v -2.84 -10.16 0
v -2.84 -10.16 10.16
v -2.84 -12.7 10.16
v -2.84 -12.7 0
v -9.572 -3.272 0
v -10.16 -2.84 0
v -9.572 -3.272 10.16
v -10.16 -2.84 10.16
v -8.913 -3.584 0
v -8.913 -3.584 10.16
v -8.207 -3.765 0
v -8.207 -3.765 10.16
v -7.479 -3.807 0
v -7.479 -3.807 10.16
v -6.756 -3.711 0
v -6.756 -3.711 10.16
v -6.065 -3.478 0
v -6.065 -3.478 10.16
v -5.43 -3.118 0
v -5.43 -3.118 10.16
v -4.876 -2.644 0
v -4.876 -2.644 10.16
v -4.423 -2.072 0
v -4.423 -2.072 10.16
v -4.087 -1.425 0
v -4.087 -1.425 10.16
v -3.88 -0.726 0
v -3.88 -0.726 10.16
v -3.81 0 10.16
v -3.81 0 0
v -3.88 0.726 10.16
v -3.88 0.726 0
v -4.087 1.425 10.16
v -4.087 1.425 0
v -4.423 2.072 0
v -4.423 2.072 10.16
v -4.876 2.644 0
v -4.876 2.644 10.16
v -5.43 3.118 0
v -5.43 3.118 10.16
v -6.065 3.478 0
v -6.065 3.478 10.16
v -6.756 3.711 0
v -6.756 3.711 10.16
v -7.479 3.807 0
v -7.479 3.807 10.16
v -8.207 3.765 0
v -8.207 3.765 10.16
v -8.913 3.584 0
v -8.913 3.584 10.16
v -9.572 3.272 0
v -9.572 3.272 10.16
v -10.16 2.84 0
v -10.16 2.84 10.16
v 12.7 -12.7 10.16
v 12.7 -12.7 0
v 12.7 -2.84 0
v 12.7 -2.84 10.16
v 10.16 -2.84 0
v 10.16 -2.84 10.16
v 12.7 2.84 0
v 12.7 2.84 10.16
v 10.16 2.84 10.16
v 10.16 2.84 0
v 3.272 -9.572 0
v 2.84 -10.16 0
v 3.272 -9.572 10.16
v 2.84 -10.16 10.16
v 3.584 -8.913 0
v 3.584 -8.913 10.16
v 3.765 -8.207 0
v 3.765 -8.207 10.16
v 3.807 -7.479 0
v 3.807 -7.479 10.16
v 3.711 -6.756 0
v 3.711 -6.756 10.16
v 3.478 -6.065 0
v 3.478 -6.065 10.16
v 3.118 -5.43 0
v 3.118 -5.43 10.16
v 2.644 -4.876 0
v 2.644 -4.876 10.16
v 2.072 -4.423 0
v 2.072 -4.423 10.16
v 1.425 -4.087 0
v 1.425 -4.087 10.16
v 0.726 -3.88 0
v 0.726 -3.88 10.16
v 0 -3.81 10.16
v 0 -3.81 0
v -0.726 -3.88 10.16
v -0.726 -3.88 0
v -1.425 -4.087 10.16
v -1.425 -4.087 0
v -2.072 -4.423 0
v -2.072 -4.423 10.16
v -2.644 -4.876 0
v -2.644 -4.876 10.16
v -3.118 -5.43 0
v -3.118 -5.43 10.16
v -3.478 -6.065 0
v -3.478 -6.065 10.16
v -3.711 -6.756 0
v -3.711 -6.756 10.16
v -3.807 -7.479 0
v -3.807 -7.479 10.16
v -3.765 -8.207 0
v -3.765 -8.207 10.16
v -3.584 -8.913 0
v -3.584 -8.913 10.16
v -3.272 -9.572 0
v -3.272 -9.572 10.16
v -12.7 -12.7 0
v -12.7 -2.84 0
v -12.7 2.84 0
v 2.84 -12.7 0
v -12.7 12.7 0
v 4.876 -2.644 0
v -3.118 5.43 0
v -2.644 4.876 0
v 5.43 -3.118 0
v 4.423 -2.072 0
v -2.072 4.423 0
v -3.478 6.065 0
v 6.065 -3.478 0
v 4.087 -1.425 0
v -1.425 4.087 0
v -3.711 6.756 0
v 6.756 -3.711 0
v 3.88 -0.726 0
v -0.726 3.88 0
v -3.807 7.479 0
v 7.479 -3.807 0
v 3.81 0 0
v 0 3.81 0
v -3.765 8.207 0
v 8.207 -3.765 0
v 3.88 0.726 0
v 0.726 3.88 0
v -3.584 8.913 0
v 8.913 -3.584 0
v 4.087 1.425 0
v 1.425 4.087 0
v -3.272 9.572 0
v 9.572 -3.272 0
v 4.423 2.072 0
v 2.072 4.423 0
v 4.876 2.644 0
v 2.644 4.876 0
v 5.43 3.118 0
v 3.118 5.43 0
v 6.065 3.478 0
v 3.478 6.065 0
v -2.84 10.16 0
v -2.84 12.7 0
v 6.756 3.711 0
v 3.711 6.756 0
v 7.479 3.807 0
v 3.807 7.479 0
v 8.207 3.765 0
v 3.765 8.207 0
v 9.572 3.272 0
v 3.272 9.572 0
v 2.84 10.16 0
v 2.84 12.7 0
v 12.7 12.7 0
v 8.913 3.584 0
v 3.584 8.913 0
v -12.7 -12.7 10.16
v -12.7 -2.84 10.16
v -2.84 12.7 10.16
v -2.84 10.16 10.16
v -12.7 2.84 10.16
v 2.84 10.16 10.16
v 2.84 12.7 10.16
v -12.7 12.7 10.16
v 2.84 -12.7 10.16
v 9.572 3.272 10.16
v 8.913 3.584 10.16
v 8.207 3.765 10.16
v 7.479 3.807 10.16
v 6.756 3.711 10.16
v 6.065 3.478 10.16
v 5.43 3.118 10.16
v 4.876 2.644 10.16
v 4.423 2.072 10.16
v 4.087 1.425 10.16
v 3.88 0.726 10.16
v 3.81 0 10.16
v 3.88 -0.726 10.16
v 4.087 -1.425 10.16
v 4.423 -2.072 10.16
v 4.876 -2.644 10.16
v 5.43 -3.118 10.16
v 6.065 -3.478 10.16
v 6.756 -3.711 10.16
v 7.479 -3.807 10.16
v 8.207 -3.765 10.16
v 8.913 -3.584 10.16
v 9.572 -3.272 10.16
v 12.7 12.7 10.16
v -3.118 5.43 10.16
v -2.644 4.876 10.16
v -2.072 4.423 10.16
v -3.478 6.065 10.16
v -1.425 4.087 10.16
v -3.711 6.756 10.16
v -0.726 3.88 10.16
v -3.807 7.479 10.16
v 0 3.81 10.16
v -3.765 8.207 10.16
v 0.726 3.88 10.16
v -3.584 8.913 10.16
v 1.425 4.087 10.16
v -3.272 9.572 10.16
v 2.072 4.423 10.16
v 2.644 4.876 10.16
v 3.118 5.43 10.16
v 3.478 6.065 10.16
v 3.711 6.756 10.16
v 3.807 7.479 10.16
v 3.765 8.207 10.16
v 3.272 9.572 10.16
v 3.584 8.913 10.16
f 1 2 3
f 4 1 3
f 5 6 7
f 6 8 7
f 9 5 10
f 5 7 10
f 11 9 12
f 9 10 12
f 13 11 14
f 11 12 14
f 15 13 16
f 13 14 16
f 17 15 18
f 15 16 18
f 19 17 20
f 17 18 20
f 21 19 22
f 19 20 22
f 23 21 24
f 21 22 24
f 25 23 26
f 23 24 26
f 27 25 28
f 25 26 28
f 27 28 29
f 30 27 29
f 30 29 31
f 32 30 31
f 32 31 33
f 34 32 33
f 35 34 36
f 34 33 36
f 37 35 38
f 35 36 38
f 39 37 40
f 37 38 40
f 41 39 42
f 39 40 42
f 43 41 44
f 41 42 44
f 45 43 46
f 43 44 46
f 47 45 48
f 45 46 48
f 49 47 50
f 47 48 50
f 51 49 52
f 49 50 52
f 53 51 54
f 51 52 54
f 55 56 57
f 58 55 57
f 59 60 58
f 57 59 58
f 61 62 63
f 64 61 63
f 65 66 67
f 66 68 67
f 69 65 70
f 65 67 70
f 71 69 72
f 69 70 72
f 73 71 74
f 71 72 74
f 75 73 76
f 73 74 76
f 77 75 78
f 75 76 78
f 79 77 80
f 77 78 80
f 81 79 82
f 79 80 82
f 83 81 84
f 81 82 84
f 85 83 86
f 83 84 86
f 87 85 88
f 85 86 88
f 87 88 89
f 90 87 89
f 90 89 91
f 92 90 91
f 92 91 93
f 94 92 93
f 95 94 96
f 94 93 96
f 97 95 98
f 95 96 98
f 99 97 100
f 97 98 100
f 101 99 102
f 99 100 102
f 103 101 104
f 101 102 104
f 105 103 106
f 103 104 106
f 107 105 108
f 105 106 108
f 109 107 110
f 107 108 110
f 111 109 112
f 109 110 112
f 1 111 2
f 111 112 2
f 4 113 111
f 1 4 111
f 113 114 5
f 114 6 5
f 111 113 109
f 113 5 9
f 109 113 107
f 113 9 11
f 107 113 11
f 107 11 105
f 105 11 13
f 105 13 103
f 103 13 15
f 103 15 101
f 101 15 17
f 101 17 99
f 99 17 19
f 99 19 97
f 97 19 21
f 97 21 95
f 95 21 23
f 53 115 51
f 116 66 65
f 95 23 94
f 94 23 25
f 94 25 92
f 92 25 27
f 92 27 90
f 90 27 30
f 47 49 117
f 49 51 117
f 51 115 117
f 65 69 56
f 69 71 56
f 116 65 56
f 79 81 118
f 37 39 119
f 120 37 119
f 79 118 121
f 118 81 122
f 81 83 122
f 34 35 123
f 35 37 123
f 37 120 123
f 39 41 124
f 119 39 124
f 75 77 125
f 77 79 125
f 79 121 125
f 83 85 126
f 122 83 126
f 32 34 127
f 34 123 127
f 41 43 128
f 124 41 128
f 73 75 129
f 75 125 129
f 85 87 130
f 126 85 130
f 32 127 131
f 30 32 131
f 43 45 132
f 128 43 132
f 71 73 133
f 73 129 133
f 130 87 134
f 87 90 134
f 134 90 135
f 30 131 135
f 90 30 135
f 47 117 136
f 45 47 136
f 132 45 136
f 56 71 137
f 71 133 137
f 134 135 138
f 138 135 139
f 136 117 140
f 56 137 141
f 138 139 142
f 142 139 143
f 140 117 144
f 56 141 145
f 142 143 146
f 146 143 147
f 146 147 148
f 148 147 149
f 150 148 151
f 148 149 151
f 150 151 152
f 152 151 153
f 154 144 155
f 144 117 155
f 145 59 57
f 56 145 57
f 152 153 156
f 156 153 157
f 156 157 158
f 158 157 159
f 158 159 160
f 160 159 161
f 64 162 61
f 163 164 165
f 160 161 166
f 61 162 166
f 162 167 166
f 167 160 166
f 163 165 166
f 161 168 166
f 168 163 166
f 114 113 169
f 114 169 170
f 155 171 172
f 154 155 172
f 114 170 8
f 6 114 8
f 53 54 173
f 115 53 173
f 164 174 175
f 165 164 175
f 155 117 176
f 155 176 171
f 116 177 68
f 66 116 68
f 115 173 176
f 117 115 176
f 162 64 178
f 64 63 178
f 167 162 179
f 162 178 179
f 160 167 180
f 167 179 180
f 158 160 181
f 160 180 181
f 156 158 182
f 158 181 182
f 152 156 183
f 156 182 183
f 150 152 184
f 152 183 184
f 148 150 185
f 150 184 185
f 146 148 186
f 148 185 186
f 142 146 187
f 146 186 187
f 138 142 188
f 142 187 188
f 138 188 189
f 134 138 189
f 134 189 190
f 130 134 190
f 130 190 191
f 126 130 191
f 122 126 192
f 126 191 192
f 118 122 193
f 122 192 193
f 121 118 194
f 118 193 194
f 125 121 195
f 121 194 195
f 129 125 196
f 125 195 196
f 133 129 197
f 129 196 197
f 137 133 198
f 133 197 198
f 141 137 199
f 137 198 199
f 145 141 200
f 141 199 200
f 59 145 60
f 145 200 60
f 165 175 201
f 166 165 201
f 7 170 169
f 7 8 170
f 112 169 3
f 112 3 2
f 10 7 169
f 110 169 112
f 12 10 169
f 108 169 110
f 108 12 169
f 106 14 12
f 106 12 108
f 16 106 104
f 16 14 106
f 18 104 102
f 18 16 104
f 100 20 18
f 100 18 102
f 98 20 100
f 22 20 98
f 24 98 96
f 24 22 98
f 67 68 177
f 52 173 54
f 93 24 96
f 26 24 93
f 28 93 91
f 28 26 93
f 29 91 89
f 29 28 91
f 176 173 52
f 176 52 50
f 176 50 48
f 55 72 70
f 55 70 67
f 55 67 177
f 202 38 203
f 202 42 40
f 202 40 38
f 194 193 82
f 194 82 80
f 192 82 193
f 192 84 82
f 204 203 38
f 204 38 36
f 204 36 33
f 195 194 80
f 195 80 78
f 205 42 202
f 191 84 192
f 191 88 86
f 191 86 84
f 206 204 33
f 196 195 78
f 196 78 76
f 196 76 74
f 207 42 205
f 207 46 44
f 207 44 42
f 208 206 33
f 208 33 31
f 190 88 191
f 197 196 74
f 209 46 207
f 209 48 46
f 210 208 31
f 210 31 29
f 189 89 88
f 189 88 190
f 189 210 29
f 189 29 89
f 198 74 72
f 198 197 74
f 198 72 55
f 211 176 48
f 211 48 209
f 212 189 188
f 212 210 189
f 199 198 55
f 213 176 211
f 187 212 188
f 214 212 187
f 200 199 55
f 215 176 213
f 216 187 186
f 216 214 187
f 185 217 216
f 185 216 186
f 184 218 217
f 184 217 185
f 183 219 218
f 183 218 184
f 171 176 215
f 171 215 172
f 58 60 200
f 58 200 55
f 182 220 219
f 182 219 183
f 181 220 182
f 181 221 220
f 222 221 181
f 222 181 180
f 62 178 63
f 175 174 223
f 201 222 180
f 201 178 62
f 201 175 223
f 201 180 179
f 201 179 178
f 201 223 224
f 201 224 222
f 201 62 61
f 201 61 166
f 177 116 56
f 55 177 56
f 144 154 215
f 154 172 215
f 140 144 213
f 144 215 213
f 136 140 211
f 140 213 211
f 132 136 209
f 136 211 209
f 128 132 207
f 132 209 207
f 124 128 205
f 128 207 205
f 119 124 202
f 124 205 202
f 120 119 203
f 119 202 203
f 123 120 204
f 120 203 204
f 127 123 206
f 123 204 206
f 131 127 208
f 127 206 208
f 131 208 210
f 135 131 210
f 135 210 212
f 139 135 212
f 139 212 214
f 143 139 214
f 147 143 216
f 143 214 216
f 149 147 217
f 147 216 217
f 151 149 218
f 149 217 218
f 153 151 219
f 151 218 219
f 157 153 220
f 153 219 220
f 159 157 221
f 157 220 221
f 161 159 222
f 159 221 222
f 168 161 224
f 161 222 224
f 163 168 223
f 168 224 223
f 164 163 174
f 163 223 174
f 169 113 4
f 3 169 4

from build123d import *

# Parameters (mm, degrees)
F0_W            = 25.4
F0_H            = 25.4
F1_DEPTH        = 10.16
F2_R            = 3.81
F3_DEPTH        = 25.4
F3_COPIES_COUNT = 4
F5_DEPTH        = 25.4
F5_COPIES_COUNT = 4


# Not quite as in the source:
# - a pattern or mirror of a feature is missing from the dataset's text; its kind, count and spacing are read off the source's solid


with BuildPart() as f1:
    # F0 (on Top) → F1 (new body)
    with BuildSketch(Plane.XY):
        Rectangle(F0_W, F0_H)
    extrude(amount=F1_DEPTH)

    # F2 (on face) → F3 (cut)
    with BuildSketch(Plane.XY.offset(10.16)):
        with Locations((0, -7.62)):
            Circle(F2_R)
    f3 = extrude(amount=-F3_DEPTH, mode=Mode.SUBTRACT)

    # F3_copies: F3 ×4 about axis
    f3_copies_axis = Axis((0, 0, 0), (0, 0, 1))
    for i in range(1, F3_COPIES_COUNT):
        add(f3.rotate(f3_copies_axis, i * 360 / F3_COPIES_COUNT), mode=Mode.SUBTRACT)

    # F4 (on face) → F5 (cut)
    with BuildSketch(Plane.XY.offset(10.16)):
        with BuildLine():
            Line((-2.8398063314, -10.16), (-2.8398063314, -12.7))
            Line((-2.8398063314, -12.7), (2.8398063314, -12.7))
            Line((2.8398063314, -12.7), (2.8398063314, -10.16))
            ThreePointArc((2.8398063314, -10.16), (0, -11.43), (-2.8398063314, -10.16))
        make_face()
    f5 = extrude(amount=-F5_DEPTH, mode=Mode.SUBTRACT)

    # F5_copies: F5 ×4 about axis
    f5_copies_axis = Axis((0, 0, 0), (0, 0, 1))
    for i in range(1, F5_COPIES_COUNT):
        add(f5.rotate(f5_copies_axis, i * 360 / F5_COPIES_COUNT), mode=Mode.SUBTRACT)


solid = f1.part
